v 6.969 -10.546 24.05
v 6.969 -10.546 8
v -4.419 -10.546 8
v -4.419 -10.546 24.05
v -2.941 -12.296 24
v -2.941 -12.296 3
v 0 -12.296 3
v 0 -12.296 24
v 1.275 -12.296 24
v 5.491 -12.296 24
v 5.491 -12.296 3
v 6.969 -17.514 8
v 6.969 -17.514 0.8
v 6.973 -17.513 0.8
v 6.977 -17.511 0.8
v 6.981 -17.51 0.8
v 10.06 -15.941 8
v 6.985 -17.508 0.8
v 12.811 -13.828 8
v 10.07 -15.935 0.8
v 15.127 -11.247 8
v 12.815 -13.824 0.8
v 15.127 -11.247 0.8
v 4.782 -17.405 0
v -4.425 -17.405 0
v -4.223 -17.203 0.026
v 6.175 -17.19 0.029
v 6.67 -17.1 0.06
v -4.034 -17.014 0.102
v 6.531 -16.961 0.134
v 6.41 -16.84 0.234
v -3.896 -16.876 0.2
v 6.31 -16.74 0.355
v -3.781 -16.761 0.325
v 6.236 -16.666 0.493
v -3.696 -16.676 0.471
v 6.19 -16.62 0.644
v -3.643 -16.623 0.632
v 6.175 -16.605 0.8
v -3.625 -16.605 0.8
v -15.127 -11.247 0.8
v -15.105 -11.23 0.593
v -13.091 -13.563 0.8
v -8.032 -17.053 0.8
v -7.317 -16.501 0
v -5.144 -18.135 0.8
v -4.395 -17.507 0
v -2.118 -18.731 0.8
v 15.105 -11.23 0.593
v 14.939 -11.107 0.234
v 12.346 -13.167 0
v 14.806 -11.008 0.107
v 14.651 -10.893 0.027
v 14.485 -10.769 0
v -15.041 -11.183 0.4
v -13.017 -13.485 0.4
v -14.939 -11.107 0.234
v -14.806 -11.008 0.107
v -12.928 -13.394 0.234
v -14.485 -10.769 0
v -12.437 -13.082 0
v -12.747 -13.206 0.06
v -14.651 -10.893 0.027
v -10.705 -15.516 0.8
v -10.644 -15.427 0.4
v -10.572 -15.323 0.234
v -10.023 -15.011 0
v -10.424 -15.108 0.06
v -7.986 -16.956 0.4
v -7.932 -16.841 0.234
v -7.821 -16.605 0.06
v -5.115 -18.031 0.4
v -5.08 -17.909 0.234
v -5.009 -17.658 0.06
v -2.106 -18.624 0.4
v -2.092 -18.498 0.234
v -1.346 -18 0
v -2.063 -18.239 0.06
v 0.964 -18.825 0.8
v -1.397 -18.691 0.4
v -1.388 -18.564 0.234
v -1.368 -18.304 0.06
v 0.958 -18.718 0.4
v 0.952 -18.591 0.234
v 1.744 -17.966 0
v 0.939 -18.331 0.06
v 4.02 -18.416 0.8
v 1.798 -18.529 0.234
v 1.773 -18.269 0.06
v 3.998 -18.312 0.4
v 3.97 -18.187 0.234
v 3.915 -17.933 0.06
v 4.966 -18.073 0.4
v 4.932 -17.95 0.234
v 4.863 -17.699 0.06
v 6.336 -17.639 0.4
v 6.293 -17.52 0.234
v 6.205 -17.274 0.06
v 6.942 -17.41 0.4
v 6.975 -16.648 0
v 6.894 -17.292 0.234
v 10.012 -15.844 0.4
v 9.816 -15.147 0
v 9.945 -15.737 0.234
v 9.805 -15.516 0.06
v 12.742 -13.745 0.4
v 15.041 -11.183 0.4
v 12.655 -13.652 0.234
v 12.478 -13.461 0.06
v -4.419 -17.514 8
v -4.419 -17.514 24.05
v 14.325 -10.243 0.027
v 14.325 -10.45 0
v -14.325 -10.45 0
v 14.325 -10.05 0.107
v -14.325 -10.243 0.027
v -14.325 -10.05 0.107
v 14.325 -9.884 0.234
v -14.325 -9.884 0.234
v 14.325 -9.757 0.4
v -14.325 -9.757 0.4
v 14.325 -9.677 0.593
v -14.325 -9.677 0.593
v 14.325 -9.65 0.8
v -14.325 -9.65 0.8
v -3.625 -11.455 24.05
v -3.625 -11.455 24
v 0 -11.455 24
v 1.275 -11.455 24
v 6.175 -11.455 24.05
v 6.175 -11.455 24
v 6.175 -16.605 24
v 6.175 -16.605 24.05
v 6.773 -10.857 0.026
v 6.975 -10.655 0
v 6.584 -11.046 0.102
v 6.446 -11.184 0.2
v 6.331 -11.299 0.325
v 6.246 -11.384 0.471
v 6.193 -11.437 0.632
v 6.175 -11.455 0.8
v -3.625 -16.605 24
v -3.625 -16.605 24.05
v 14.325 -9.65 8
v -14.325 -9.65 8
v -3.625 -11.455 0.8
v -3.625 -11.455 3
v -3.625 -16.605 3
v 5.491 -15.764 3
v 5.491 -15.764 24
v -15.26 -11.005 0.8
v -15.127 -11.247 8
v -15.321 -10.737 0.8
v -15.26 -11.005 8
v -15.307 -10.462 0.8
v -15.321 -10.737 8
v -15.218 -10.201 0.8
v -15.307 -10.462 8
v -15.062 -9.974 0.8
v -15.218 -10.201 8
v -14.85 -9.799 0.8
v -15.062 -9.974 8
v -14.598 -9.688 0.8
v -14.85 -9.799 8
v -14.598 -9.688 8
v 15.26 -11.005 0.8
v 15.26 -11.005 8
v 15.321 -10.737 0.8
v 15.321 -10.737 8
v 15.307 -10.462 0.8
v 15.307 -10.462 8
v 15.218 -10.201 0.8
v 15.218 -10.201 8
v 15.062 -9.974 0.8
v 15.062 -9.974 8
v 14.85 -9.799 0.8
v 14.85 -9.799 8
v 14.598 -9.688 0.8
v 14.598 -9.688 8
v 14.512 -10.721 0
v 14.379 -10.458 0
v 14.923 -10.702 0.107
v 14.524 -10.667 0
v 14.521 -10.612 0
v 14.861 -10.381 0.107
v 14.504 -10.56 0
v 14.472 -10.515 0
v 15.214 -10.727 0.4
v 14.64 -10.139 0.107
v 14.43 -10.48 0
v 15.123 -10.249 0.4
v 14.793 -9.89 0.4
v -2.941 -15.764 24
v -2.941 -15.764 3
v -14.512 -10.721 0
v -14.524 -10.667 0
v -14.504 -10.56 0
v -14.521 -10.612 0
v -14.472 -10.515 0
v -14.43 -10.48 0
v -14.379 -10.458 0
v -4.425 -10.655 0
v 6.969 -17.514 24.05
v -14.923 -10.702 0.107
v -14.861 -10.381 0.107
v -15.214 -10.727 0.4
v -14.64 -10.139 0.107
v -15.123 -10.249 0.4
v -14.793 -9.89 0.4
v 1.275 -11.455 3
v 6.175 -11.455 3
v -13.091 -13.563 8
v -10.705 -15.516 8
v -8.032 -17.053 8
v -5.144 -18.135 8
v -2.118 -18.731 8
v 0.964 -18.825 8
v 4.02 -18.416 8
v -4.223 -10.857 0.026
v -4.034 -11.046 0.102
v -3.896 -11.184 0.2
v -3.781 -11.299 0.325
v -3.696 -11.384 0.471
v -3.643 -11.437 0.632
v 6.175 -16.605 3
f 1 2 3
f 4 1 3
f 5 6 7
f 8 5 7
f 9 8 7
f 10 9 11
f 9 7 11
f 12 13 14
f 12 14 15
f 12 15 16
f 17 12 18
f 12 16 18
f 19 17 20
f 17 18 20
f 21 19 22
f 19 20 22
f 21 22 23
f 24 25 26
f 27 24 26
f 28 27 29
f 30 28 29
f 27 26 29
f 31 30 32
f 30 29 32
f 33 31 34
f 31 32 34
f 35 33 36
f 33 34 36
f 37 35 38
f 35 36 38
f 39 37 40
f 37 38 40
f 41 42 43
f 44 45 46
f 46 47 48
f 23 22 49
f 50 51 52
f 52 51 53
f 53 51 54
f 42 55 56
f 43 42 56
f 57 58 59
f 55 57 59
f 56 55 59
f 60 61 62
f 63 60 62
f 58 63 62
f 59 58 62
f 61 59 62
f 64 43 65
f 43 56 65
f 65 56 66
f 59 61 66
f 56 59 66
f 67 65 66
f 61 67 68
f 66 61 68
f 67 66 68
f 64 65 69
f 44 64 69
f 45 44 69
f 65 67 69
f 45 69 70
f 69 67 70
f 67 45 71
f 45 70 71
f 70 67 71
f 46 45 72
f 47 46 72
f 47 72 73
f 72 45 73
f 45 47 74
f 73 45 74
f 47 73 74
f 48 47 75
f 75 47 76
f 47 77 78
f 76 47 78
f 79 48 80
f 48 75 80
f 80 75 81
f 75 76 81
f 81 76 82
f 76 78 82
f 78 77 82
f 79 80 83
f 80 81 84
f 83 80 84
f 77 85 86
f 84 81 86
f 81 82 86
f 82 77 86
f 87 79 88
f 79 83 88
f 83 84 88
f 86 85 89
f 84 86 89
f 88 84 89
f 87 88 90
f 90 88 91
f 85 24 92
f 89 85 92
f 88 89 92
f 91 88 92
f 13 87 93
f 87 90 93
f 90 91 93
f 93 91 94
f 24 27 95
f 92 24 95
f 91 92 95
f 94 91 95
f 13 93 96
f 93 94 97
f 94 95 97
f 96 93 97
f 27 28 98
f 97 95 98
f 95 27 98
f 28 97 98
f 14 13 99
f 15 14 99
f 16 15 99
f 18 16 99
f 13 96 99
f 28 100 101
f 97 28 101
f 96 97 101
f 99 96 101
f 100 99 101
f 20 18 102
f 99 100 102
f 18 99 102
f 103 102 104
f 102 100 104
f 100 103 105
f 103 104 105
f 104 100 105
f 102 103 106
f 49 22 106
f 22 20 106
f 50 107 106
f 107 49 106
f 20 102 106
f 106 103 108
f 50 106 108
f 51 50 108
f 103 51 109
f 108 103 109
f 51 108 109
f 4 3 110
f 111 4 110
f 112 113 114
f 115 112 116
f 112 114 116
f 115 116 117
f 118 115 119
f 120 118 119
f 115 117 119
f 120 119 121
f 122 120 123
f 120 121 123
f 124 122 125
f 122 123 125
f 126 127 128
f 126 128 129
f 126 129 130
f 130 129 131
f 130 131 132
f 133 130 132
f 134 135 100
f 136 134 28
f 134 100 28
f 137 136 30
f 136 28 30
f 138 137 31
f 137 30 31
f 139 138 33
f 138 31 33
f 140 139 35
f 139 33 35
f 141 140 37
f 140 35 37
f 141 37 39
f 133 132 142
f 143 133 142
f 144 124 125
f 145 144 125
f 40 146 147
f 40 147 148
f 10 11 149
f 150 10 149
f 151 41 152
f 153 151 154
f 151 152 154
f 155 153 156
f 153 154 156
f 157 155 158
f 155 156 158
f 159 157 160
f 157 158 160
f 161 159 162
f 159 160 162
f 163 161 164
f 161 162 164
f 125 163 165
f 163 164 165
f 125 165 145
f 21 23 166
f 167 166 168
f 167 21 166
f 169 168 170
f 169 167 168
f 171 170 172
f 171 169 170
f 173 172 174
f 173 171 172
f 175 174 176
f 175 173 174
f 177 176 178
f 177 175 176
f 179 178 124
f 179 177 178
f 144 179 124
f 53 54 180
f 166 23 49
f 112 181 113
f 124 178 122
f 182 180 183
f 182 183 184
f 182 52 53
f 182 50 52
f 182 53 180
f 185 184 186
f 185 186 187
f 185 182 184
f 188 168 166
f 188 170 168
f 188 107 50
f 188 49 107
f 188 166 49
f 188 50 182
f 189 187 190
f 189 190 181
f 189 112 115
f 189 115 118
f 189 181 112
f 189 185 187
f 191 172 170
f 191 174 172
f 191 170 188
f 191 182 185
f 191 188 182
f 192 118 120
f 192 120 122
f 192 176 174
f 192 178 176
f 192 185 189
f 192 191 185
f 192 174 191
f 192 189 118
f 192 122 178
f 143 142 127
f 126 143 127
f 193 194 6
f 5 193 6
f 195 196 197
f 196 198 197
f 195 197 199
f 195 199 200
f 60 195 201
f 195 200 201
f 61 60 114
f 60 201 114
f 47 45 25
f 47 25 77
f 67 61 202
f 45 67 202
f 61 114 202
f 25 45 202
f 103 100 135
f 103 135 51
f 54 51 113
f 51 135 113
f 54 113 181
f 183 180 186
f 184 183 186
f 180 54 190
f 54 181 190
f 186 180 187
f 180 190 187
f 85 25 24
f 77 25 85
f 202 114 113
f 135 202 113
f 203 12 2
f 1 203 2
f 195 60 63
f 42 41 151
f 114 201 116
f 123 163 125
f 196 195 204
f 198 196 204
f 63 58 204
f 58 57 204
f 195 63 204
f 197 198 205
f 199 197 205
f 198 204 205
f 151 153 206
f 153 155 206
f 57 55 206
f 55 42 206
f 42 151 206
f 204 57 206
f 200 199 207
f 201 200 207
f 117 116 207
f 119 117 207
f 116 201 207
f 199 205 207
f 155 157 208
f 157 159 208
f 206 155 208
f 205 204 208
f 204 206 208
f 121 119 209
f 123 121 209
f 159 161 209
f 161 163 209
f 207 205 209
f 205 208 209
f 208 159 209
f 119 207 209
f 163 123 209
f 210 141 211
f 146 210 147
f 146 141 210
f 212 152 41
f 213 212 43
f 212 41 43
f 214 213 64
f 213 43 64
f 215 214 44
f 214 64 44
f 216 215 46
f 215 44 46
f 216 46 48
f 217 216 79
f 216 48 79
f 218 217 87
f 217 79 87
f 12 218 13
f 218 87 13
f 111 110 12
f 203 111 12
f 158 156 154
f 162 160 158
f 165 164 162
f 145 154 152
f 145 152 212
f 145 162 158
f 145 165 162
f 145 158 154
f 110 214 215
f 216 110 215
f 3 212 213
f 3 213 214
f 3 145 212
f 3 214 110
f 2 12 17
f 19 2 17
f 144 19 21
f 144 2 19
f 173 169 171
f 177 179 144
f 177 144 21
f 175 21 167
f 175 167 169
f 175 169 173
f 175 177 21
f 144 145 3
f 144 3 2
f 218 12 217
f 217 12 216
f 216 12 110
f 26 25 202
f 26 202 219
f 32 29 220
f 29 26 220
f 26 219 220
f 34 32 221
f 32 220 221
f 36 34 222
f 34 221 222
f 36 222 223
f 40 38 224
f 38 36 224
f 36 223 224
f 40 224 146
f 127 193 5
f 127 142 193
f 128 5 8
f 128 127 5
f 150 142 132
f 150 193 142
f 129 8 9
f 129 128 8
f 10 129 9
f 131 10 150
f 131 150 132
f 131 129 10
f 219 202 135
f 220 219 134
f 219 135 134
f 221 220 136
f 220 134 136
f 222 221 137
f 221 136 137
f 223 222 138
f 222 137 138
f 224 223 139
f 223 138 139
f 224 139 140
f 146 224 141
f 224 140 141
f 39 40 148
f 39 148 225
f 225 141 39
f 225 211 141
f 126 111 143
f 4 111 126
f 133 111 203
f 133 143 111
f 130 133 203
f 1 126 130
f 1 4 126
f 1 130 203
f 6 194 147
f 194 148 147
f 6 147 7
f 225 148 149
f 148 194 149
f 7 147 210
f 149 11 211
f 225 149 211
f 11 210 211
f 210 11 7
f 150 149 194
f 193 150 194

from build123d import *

# Parameters (mm, degrees)
F0_W         = 1.275
F0_H         = 0.8956698048
F0_H_2       = 0.9093301952
F0_H_3       = 0.8412417081
F1_DEPTH     = 8
F2_DEPTH     = 3
F3_DEPTH     = 21
F4_DEPTH     = 24.05
F5_R         = 1
F6_T1_DEPTH  = 28.6496073272
F6_T3_DEPTH  = 9.8
F6_T5_DEPTH  = 5.15
F6_T8_ANGLE  = 126.6295364974
F6_T10_ANGLE = 126.6295364974
F6_T12_ANGLE = 106.7409270051
F6_T17_DEPTH = 11.8
F6_T21_DEPTH = 7.15
F6_T28_DEPTH = 11.8
F6_T32_DEPTH = 7.15
F6_T39_DEPTH = 7.15
F6_T43_DEPTH = 11.8
F6_T50_DEPTH = 11.8
F6_T54_DEPTH = 7.15


# Not quite as in the source:
# - a fillet or chamfer that OpenCascade refuses, or shapes differently, is made with other operations: its cross-section is extruded or revolved along the edge and cut away or added


with BuildPart() as f1:
    # F0 (on Top) → F1 (new body)
    with BuildSketch(Plane.XY):
        with BuildLine():
            Line((0, -9.65), (-16.1925908983, -9.65))
            ThreePointArc((-16.1925908983, -9.65), (-6.0604727533, -17.8491784127), (6.9692709671, -17.5143301952))
            Line((6.9692709671, -17.5143301952), (-4.4192709671, -17.5143301952))
            Line((-4.4192709671, -17.5143301952), (-4.4192709671, -10.5456698048))
            Line((-4.4192709671, -10.5456698048), (0, -10.5456698048))
            Line((0, -10.5456698048), (0, -9.65))
        make_face()
        with BuildLine():
            ThreePointArc((6.9692709671, -17.5143301952), (12.2302855086, -14.3437309086), (16.1925908983, -9.65))
            Line((16.1925908983, -9.65), (1.275, -9.65))
            Line((1.275, -9.65), (1.275, -10.5456698048))
            Line((1.275, -10.5456698048), (6.9692709671, -10.5456698048))
            Line((6.9692709671, -10.5456698048), (6.9692709671, -17.5143301952))
        make_face()
        with Locations((0.6375, -10.0978349024)):
            Rectangle(F0_W, F0_H)
        Polygon((-4.4192709671, -17.5143301952), (6.9692709671, -17.5143301952), (6.9692709671, -10.5456698048), (1.275, -10.5456698048), (1.275, -11.455), (6.175, -11.455), (6.175, -16.605), (-3.625, -16.605), (-3.625, -11.455), (0, -11.455), (0, -10.5456698048), (-4.4192709671, -10.5456698048), align=None)
        with Locations((0.6375, -11.0003349024)):
            Rectangle(F0_W, F0_H_2)
        Polygon((0, -12.2962417081), (0, -11.455), (-3.625, -11.455), (-3.625, -16.605), (6.175, -16.605), (6.175, -11.455), (1.275, -11.455), (1.275, -12.2962417081), (5.4913964123, -12.2962417081), (5.4913964123, -15.7637582919), (-2.9413964123, -15.7637582919), (-2.9413964123, -12.2962417081), align=None)
        with Locations((0.6375, -11.875620854)):
            Rectangle(F0_W, F0_H_3)
    extrude(amount=F1_DEPTH)

    # F0 (on Top) → F2 (cut)
    with BuildSketch(Plane.XY):
        Polygon((0, -12.2962417081), (0, -11.455), (-3.625, -11.455), (-3.625, -16.605), (6.175, -16.605), (6.175, -11.455), (1.275, -11.455), (1.275, -12.2962417081), (5.4913964123, -12.2962417081), (5.4913964123, -15.7637582919), (-2.9413964123, -15.7637582919), (-2.9413964123, -12.2962417081), align=None)
        with Locations((0.6375, -11.875620854)):
            Rectangle(F0_W, F0_H_3)
    extrude(amount=F2_DEPTH, mode=Mode.SUBTRACT)

    # F3 (add): a face of the model
    f3_faces = [f1.faces().sort_by_distance(p)[0] for p in [
        (1.275, -16.4942920509, 3),
    ]]
    extrude(f3_faces, amount=-F3_DEPTH)

    # F0 (on Top) → F4 (join)
    with BuildSketch(Plane.XY):
        Polygon((-4.4192709671, -17.5143301952), (6.9692709671, -17.5143301952), (6.9692709671, -10.5456698048), (1.275, -10.5456698048), (1.275, -11.455), (6.175, -11.455), (6.175, -16.605), (-3.625, -16.605), (-3.625, -11.455), (0, -11.455), (0, -10.5456698048), (-4.4192709671, -10.5456698048), align=None)
        with Locations((0.6375, -11.0003349024)):
            Rectangle(F0_W, F0_H_2)
    extrude(amount=F4_DEPTH)

    # F5
    f5_edges = [f1.edges().sort_by_distance(p)[0] for p in [
        (16.192591, -9.65, 4),
        (-16.192591, -9.65, 4),
    ]]
    fillet(f5_edges, radius=F5_R)

    # F6: fillet of radius 0.8 on 8 edges, made by hand

    # F6_s2 → F6_t1 (cut)
    with BuildSketch(Plane.YZ.offset(-14.3248036636)):
        with BuildLine():
            ThreePointArc((-10.45, 0), (-9.8843145751, 0.2343145751), (-9.65, 0.8))
            Line((-9.65, 0.8), (-9.65, 0))
            Line((-9.65, 0), (-10.45, 0))
        make_face()
    extrude(amount=F6_T1_DEPTH, mode=Mode.SUBTRACT)

    # F6_s4 → F6_t3 (cut)
    with BuildSketch(Plane.YZ.offset(-3.625)):
        with BuildLine():
            ThreePointArc((-17.405, 0), (-16.8393145751, 0.2343145751), (-16.605, 0.8))
            Line((-16.605, 0.8), (-16.605, 0))
            Line((-16.605, 0), (-17.405, 0))
        make_face()
        with BuildLine():
            ThreePointArc((-10.655, 0), (-11.2206854249, 0.2343145751), (-11.455, 0.8))
            Line((-11.455, 0.8), (-11.455, 0))
            Line((-11.455, 0), (-10.655, 0))
        make_face()
    extrude(amount=F6_T3_DEPTH, mode=Mode.SUBTRACT)

    # F6_s6 → F6_t5 (cut)
    with BuildSketch(Plane.XZ.offset(11.455)):
        with BuildLine():
            ThreePointArc((-4.425, 0), (-3.8593145751, 0.2343145751), (-3.625, 0.8))
            Line((-3.625, 0.8), (-3.625, 0))
            Line((-3.625, 0), (-4.425, 0))
        make_face()
        with BuildLine():
            ThreePointArc((6.975, 0), (6.4093145751, 0.2343145751), (6.175, 0.8))
            Line((6.175, 0.8), (6.175, 0))
            Line((6.175, 0), (6.975, 0))
        make_face()
    extrude(amount=F6_T5_DEPTH, mode=Mode.SUBTRACT)

    # F6_s7 → F6_t8 (revolve, cut)
    with BuildSketch(Plane(origin=(0, 0, 0), x_dir=(0, 0, 1), z_dir=(-0.5966386555, -0.8025100092, 0))):
        with BuildLine():
            ThreePointArc((0, -18.05), (0.2343145751, -18.6156854249), (0.8, -18.85))
            Line((0.8, -18.85), (0, -18.85))
            Line((0, -18.85), (0, -18.05))
        make_face()
    revolve(axis=Axis((14.3248036636, -10.65, 0), (0, 0, 1)), revolution_arc=F6_T8_ANGLE, mode=Mode.SUBTRACT)

    # F6_s9 → F6_t10 (revolve, cut)
    with BuildSketch(Plane(origin=(0, 0, 0), x_dir=(0, 0, 1), z_dir=(0.5966386555, -0.8025100092, 0))):
        with BuildLine():
            ThreePointArc((0, 18.05), (0.2343145751, 18.6156854249), (0.8, 18.85))
            Line((0.8, 18.85), (0, 18.85))
            Line((0, 18.85), (0, 18.05))
        make_face()
    revolve(axis=Axis((-14.3248036636, -10.65, 0), (0, 0, -1)), revolution_arc=F6_T10_ANGLE, mode=Mode.SUBTRACT)

    # F6_s11 → F6_t12 (revolve, cut)
    with BuildSketch(Plane(origin=(0, 0, 0), x_dir=(0, 0, 1), z_dir=(-0.5966386555, 0.8025100092, 0))):
        with BuildLine():
            ThreePointArc((0.8, -18.85), (0.2343145751, -18.6156854249), (0, -18.05))
            Line((0, -18.05), (0, -18.85))
            Line((0, -18.85), (0.8, -18.85))
        make_face()
    revolve(axis=Axis((0, 0, 0), (0, 0, 1)), revolution_arc=F6_T12_ANGLE, mode=Mode.SUBTRACT)


with BuildPart() as f6_tool15:
    # F6_s16 → F6_t17 (new body)
    with BuildSketch(Plane.YZ.offset(-5.625)):
        with BuildLine():
            ThreePointArc((-17.405, 0), (-16.8393145751, 0.2343145751), (-16.605, 0.8))
            Line((-16.605, 0.8), (-16.605, 0))
            Line((-16.605, 0), (-17.405, 0))
        make_face()
    extrude(amount=F6_T17_DEPTH)

    split(bisect_by=Plane.YZ.offset(-3.625), keep=Keep.BOTTOM)


with BuildPart() as f6_tool19:
    # F6_s20 → F6_t21 (new body)
    with BuildSketch(Plane.XZ.offset(11.455)):
        with BuildLine():
            ThreePointArc((-4.425, 0), (-3.8593145751, 0.2343145751), (-3.625, 0.8))
            Line((-3.625, 0.8), (-3.625, 0))
            Line((-3.625, 0), (-4.425, 0))
        make_face()
    extrude(amount=F6_T21_DEPTH)

    split(bisect_by=Plane.XZ.offset(16.605), keep=Keep.TOP)


with BuildPart() as f6_tool15_1:
    add(f6_tool15.part)

    # F6_t23: intersect F6_tool19
    add(f6_tool19.part, mode=Mode.INTERSECT)


with BuildPart() as f1_1:
    add(f1.part)

    # F6_t13: cut F6_tool15
    add(f6_tool15_1.part, mode=Mode.SUBTRACT)


with BuildPart() as f6_tool26:
    # F6_s27 → F6_t28 (new body)
    with BuildSketch(Plane.YZ.offset(-3.625)):
        with BuildLine():
            ThreePointArc((-17.405, 0), (-16.8393145751, 0.2343145751), (-16.605, 0.8))
            Line((-16.605, 0.8), (-16.605, 0))
            Line((-16.605, 0), (-17.405, 0))
        make_face()
    extrude(amount=F6_T28_DEPTH)

    split(bisect_by=Plane.YZ.offset(6.175), keep=Keep.TOP)


with BuildPart() as f6_tool30:
    # F6_s31 → F6_t32 (new body)
    with BuildSketch(Plane.XZ.offset(18.605)):
        with BuildLine():
            ThreePointArc((6.975, 0), (6.4093145751, 0.2343145751), (6.175, 0.8))
            Line((6.175, 0.8), (6.175, 0))
            Line((6.175, 0), (6.975, 0))
        make_face()
    extrude(amount=-F6_T32_DEPTH)

    split(bisect_by=Plane.XZ.offset(16.605), keep=Keep.TOP)


with BuildPart() as f6_tool26_1:
    add(f6_tool26.part)

    # F6_t34: intersect F6_tool30
    add(f6_tool30.part, mode=Mode.INTERSECT)


with BuildPart() as f1_2:
    add(f1_1.part)

    # F6_t24: cut F6_tool26
    add(f6_tool26_1.part, mode=Mode.SUBTRACT)


with BuildPart() as f6_tool37:
    # F6_s38 → F6_t39 (new body)
    with BuildSketch(Plane.XZ.offset(9.455)):
        with BuildLine():
            ThreePointArc((-4.425, 0), (-3.8593145751, 0.2343145751), (-3.625, 0.8))
            Line((-3.625, 0.8), (-3.625, 0))
            Line((-3.625, 0), (-4.425, 0))
        make_face()
    extrude(amount=F6_T39_DEPTH)

    split(bisect_by=Plane.XZ.offset(11.455), keep=Keep.BOTTOM)


with BuildPart() as f6_tool41:
    # F6_s42 → F6_t43 (new body)
    with BuildSketch(Plane.YZ.offset(6.175)):
        with BuildLine():
            ThreePointArc((-10.655, 0), (-11.2206854249, 0.2343145751), (-11.455, 0.8))
            Line((-11.455, 0.8), (-11.455, 0))
            Line((-11.455, 0), (-10.655, 0))
        make_face()
    extrude(amount=-F6_T43_DEPTH)

    split(bisect_by=Plane.YZ.offset(-3.625), keep=Keep.BOTTOM)


with BuildPart() as f6_tool37_1:
    add(f6_tool37.part)

    # F6_t45: intersect F6_tool41
    add(f6_tool41.part, mode=Mode.INTERSECT)


with BuildPart() as f1_3:
    add(f1_2.part)

    # F6_t35: cut F6_tool37
    add(f6_tool37_1.part, mode=Mode.SUBTRACT)


with BuildPart() as f6_tool48:
    # F6_s49 → F6_t50 (new body)
    with BuildSketch(Plane.YZ.offset(8.175)):
        with BuildLine():
            ThreePointArc((-10.655, 0), (-11.2206854249, 0.2343145751), (-11.455, 0.8))
            Line((-11.455, 0.8), (-11.455, 0))
            Line((-11.455, 0), (-10.655, 0))
        make_face()
    extrude(amount=-F6_T50_DEPTH)

    split(bisect_by=Plane.YZ.offset(6.175), keep=Keep.TOP)


with BuildPart() as f6_tool52:
    # F6_s53 → F6_t54 (new body)
    with BuildSketch(Plane.XZ.offset(16.605)):
        with BuildLine():
            ThreePointArc((6.975, 0), (6.4093145751, 0.2343145751), (6.175, 0.8))
            Line((6.175, 0.8), (6.175, 0))
            Line((6.175, 0), (6.975, 0))
        make_face()
    extrude(amount=-F6_T54_DEPTH)

    split(bisect_by=Plane.XZ.offset(11.455), keep=Keep.BOTTOM)


with BuildPart() as f6_tool48_1:
    add(f6_tool48.part)

    # F6_t56: intersect F6_tool52
    add(f6_tool52.part, mode=Mode.INTERSECT)


with BuildPart() as f1_4:
    add(f1_3.part)

    # F6_t46: cut F6_tool48
    add(f6_tool48_1.part, mode=Mode.SUBTRACT)


solid = f1_4.part
